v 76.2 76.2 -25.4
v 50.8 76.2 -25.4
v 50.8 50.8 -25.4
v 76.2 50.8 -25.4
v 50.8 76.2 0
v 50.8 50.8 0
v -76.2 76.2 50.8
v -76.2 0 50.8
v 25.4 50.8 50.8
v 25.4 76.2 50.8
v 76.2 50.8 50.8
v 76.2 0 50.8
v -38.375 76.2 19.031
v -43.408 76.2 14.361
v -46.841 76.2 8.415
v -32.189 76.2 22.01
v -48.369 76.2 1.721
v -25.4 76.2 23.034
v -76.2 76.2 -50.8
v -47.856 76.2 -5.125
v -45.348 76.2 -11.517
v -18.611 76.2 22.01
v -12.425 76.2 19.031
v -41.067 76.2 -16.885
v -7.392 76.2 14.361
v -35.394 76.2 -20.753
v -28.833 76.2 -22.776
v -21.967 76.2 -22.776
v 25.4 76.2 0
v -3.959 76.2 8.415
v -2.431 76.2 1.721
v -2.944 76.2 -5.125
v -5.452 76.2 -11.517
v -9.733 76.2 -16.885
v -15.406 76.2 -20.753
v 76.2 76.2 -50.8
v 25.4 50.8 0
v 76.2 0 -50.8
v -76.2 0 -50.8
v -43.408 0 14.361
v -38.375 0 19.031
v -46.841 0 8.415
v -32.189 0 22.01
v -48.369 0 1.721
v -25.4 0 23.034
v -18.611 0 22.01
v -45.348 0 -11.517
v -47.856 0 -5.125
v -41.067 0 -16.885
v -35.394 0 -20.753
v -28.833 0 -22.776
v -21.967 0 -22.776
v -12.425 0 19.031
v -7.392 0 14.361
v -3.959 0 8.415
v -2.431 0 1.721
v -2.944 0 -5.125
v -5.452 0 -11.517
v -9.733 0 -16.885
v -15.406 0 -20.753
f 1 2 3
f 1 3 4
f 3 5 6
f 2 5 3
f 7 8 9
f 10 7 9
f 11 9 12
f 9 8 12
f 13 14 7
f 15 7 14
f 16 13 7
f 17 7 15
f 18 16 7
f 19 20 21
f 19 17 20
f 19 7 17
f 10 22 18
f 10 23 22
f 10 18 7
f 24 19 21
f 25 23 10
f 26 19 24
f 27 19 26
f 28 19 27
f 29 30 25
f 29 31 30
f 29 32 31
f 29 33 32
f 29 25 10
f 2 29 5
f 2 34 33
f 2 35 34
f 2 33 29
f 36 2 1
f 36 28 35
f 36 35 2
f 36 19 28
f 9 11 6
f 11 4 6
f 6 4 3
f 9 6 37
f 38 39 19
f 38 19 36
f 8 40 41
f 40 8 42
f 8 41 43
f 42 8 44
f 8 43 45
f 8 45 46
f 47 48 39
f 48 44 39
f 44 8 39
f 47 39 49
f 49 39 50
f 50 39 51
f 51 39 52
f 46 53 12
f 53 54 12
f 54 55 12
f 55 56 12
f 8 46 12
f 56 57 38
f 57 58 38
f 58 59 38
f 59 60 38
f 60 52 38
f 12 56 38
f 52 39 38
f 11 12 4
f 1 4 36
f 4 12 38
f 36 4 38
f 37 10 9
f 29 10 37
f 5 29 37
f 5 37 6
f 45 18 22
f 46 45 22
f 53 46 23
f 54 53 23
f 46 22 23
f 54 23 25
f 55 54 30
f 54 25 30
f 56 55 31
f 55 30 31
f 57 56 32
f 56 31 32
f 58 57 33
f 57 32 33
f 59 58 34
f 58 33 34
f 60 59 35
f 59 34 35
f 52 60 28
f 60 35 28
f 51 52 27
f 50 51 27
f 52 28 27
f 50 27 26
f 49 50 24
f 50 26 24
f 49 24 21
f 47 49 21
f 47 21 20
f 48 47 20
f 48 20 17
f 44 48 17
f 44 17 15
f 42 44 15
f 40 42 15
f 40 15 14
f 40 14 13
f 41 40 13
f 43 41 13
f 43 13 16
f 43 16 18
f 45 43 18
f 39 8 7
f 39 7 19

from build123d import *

# Parameters (mm, degrees)
SKETCH1_W           = 152.4
SKETCH1_H           = 101.6
BOSS_EXTRUDE1_DEPTH = 76.2
CUT_EXTRUDE1_DEPTH  = 25.4
SKETCH3_R           = 23.033719166
CUT_EXTRUDE2_DEPTH  = 120.1365603


with BuildPart() as part:
    # Sketch1 → Boss-Extrude1 (new body)
    with BuildSketch(Plane(origin=(0, 0, 0), x_dir=(1, 0, 0), z_dir=(0, 1, 0))):
        Rectangle(SKETCH1_W, SKETCH1_H)
    extrude(amount=BOSS_EXTRUDE1_DEPTH)

    # Sketch2 → Cut-Extrude1 (cut)
    with BuildSketch(Plane(origin=(0, 76.2, 0), x_dir=(1, 0, 0), z_dir=(0, 1, 0))):
        Polygon((76.2, -50.8), (25.4, -50.8), (25.4, 0), (50.8, 0), (50.8, 25.4), (76.2, 25.4), (76.2, 15.210104037), align=None)
    extrude(amount=-CUT_EXTRUDE1_DEPTH, mode=Mode.SUBTRACT)

    # Sketch3 → Cut-Extrude2 (cut, through all)
    with BuildSketch(Plane(origin=(0, 76.2, 0), x_dir=(1, 0, 0), z_dir=(0, 1, 0))):
        with Locations(Location((-25.4, 0, 0), (0, 0, 270))):
            Circle(SKETCH3_R)
    extrude(amount=-CUT_EXTRUDE2_DEPTH, mode=Mode.SUBTRACT)


solid = part.part
